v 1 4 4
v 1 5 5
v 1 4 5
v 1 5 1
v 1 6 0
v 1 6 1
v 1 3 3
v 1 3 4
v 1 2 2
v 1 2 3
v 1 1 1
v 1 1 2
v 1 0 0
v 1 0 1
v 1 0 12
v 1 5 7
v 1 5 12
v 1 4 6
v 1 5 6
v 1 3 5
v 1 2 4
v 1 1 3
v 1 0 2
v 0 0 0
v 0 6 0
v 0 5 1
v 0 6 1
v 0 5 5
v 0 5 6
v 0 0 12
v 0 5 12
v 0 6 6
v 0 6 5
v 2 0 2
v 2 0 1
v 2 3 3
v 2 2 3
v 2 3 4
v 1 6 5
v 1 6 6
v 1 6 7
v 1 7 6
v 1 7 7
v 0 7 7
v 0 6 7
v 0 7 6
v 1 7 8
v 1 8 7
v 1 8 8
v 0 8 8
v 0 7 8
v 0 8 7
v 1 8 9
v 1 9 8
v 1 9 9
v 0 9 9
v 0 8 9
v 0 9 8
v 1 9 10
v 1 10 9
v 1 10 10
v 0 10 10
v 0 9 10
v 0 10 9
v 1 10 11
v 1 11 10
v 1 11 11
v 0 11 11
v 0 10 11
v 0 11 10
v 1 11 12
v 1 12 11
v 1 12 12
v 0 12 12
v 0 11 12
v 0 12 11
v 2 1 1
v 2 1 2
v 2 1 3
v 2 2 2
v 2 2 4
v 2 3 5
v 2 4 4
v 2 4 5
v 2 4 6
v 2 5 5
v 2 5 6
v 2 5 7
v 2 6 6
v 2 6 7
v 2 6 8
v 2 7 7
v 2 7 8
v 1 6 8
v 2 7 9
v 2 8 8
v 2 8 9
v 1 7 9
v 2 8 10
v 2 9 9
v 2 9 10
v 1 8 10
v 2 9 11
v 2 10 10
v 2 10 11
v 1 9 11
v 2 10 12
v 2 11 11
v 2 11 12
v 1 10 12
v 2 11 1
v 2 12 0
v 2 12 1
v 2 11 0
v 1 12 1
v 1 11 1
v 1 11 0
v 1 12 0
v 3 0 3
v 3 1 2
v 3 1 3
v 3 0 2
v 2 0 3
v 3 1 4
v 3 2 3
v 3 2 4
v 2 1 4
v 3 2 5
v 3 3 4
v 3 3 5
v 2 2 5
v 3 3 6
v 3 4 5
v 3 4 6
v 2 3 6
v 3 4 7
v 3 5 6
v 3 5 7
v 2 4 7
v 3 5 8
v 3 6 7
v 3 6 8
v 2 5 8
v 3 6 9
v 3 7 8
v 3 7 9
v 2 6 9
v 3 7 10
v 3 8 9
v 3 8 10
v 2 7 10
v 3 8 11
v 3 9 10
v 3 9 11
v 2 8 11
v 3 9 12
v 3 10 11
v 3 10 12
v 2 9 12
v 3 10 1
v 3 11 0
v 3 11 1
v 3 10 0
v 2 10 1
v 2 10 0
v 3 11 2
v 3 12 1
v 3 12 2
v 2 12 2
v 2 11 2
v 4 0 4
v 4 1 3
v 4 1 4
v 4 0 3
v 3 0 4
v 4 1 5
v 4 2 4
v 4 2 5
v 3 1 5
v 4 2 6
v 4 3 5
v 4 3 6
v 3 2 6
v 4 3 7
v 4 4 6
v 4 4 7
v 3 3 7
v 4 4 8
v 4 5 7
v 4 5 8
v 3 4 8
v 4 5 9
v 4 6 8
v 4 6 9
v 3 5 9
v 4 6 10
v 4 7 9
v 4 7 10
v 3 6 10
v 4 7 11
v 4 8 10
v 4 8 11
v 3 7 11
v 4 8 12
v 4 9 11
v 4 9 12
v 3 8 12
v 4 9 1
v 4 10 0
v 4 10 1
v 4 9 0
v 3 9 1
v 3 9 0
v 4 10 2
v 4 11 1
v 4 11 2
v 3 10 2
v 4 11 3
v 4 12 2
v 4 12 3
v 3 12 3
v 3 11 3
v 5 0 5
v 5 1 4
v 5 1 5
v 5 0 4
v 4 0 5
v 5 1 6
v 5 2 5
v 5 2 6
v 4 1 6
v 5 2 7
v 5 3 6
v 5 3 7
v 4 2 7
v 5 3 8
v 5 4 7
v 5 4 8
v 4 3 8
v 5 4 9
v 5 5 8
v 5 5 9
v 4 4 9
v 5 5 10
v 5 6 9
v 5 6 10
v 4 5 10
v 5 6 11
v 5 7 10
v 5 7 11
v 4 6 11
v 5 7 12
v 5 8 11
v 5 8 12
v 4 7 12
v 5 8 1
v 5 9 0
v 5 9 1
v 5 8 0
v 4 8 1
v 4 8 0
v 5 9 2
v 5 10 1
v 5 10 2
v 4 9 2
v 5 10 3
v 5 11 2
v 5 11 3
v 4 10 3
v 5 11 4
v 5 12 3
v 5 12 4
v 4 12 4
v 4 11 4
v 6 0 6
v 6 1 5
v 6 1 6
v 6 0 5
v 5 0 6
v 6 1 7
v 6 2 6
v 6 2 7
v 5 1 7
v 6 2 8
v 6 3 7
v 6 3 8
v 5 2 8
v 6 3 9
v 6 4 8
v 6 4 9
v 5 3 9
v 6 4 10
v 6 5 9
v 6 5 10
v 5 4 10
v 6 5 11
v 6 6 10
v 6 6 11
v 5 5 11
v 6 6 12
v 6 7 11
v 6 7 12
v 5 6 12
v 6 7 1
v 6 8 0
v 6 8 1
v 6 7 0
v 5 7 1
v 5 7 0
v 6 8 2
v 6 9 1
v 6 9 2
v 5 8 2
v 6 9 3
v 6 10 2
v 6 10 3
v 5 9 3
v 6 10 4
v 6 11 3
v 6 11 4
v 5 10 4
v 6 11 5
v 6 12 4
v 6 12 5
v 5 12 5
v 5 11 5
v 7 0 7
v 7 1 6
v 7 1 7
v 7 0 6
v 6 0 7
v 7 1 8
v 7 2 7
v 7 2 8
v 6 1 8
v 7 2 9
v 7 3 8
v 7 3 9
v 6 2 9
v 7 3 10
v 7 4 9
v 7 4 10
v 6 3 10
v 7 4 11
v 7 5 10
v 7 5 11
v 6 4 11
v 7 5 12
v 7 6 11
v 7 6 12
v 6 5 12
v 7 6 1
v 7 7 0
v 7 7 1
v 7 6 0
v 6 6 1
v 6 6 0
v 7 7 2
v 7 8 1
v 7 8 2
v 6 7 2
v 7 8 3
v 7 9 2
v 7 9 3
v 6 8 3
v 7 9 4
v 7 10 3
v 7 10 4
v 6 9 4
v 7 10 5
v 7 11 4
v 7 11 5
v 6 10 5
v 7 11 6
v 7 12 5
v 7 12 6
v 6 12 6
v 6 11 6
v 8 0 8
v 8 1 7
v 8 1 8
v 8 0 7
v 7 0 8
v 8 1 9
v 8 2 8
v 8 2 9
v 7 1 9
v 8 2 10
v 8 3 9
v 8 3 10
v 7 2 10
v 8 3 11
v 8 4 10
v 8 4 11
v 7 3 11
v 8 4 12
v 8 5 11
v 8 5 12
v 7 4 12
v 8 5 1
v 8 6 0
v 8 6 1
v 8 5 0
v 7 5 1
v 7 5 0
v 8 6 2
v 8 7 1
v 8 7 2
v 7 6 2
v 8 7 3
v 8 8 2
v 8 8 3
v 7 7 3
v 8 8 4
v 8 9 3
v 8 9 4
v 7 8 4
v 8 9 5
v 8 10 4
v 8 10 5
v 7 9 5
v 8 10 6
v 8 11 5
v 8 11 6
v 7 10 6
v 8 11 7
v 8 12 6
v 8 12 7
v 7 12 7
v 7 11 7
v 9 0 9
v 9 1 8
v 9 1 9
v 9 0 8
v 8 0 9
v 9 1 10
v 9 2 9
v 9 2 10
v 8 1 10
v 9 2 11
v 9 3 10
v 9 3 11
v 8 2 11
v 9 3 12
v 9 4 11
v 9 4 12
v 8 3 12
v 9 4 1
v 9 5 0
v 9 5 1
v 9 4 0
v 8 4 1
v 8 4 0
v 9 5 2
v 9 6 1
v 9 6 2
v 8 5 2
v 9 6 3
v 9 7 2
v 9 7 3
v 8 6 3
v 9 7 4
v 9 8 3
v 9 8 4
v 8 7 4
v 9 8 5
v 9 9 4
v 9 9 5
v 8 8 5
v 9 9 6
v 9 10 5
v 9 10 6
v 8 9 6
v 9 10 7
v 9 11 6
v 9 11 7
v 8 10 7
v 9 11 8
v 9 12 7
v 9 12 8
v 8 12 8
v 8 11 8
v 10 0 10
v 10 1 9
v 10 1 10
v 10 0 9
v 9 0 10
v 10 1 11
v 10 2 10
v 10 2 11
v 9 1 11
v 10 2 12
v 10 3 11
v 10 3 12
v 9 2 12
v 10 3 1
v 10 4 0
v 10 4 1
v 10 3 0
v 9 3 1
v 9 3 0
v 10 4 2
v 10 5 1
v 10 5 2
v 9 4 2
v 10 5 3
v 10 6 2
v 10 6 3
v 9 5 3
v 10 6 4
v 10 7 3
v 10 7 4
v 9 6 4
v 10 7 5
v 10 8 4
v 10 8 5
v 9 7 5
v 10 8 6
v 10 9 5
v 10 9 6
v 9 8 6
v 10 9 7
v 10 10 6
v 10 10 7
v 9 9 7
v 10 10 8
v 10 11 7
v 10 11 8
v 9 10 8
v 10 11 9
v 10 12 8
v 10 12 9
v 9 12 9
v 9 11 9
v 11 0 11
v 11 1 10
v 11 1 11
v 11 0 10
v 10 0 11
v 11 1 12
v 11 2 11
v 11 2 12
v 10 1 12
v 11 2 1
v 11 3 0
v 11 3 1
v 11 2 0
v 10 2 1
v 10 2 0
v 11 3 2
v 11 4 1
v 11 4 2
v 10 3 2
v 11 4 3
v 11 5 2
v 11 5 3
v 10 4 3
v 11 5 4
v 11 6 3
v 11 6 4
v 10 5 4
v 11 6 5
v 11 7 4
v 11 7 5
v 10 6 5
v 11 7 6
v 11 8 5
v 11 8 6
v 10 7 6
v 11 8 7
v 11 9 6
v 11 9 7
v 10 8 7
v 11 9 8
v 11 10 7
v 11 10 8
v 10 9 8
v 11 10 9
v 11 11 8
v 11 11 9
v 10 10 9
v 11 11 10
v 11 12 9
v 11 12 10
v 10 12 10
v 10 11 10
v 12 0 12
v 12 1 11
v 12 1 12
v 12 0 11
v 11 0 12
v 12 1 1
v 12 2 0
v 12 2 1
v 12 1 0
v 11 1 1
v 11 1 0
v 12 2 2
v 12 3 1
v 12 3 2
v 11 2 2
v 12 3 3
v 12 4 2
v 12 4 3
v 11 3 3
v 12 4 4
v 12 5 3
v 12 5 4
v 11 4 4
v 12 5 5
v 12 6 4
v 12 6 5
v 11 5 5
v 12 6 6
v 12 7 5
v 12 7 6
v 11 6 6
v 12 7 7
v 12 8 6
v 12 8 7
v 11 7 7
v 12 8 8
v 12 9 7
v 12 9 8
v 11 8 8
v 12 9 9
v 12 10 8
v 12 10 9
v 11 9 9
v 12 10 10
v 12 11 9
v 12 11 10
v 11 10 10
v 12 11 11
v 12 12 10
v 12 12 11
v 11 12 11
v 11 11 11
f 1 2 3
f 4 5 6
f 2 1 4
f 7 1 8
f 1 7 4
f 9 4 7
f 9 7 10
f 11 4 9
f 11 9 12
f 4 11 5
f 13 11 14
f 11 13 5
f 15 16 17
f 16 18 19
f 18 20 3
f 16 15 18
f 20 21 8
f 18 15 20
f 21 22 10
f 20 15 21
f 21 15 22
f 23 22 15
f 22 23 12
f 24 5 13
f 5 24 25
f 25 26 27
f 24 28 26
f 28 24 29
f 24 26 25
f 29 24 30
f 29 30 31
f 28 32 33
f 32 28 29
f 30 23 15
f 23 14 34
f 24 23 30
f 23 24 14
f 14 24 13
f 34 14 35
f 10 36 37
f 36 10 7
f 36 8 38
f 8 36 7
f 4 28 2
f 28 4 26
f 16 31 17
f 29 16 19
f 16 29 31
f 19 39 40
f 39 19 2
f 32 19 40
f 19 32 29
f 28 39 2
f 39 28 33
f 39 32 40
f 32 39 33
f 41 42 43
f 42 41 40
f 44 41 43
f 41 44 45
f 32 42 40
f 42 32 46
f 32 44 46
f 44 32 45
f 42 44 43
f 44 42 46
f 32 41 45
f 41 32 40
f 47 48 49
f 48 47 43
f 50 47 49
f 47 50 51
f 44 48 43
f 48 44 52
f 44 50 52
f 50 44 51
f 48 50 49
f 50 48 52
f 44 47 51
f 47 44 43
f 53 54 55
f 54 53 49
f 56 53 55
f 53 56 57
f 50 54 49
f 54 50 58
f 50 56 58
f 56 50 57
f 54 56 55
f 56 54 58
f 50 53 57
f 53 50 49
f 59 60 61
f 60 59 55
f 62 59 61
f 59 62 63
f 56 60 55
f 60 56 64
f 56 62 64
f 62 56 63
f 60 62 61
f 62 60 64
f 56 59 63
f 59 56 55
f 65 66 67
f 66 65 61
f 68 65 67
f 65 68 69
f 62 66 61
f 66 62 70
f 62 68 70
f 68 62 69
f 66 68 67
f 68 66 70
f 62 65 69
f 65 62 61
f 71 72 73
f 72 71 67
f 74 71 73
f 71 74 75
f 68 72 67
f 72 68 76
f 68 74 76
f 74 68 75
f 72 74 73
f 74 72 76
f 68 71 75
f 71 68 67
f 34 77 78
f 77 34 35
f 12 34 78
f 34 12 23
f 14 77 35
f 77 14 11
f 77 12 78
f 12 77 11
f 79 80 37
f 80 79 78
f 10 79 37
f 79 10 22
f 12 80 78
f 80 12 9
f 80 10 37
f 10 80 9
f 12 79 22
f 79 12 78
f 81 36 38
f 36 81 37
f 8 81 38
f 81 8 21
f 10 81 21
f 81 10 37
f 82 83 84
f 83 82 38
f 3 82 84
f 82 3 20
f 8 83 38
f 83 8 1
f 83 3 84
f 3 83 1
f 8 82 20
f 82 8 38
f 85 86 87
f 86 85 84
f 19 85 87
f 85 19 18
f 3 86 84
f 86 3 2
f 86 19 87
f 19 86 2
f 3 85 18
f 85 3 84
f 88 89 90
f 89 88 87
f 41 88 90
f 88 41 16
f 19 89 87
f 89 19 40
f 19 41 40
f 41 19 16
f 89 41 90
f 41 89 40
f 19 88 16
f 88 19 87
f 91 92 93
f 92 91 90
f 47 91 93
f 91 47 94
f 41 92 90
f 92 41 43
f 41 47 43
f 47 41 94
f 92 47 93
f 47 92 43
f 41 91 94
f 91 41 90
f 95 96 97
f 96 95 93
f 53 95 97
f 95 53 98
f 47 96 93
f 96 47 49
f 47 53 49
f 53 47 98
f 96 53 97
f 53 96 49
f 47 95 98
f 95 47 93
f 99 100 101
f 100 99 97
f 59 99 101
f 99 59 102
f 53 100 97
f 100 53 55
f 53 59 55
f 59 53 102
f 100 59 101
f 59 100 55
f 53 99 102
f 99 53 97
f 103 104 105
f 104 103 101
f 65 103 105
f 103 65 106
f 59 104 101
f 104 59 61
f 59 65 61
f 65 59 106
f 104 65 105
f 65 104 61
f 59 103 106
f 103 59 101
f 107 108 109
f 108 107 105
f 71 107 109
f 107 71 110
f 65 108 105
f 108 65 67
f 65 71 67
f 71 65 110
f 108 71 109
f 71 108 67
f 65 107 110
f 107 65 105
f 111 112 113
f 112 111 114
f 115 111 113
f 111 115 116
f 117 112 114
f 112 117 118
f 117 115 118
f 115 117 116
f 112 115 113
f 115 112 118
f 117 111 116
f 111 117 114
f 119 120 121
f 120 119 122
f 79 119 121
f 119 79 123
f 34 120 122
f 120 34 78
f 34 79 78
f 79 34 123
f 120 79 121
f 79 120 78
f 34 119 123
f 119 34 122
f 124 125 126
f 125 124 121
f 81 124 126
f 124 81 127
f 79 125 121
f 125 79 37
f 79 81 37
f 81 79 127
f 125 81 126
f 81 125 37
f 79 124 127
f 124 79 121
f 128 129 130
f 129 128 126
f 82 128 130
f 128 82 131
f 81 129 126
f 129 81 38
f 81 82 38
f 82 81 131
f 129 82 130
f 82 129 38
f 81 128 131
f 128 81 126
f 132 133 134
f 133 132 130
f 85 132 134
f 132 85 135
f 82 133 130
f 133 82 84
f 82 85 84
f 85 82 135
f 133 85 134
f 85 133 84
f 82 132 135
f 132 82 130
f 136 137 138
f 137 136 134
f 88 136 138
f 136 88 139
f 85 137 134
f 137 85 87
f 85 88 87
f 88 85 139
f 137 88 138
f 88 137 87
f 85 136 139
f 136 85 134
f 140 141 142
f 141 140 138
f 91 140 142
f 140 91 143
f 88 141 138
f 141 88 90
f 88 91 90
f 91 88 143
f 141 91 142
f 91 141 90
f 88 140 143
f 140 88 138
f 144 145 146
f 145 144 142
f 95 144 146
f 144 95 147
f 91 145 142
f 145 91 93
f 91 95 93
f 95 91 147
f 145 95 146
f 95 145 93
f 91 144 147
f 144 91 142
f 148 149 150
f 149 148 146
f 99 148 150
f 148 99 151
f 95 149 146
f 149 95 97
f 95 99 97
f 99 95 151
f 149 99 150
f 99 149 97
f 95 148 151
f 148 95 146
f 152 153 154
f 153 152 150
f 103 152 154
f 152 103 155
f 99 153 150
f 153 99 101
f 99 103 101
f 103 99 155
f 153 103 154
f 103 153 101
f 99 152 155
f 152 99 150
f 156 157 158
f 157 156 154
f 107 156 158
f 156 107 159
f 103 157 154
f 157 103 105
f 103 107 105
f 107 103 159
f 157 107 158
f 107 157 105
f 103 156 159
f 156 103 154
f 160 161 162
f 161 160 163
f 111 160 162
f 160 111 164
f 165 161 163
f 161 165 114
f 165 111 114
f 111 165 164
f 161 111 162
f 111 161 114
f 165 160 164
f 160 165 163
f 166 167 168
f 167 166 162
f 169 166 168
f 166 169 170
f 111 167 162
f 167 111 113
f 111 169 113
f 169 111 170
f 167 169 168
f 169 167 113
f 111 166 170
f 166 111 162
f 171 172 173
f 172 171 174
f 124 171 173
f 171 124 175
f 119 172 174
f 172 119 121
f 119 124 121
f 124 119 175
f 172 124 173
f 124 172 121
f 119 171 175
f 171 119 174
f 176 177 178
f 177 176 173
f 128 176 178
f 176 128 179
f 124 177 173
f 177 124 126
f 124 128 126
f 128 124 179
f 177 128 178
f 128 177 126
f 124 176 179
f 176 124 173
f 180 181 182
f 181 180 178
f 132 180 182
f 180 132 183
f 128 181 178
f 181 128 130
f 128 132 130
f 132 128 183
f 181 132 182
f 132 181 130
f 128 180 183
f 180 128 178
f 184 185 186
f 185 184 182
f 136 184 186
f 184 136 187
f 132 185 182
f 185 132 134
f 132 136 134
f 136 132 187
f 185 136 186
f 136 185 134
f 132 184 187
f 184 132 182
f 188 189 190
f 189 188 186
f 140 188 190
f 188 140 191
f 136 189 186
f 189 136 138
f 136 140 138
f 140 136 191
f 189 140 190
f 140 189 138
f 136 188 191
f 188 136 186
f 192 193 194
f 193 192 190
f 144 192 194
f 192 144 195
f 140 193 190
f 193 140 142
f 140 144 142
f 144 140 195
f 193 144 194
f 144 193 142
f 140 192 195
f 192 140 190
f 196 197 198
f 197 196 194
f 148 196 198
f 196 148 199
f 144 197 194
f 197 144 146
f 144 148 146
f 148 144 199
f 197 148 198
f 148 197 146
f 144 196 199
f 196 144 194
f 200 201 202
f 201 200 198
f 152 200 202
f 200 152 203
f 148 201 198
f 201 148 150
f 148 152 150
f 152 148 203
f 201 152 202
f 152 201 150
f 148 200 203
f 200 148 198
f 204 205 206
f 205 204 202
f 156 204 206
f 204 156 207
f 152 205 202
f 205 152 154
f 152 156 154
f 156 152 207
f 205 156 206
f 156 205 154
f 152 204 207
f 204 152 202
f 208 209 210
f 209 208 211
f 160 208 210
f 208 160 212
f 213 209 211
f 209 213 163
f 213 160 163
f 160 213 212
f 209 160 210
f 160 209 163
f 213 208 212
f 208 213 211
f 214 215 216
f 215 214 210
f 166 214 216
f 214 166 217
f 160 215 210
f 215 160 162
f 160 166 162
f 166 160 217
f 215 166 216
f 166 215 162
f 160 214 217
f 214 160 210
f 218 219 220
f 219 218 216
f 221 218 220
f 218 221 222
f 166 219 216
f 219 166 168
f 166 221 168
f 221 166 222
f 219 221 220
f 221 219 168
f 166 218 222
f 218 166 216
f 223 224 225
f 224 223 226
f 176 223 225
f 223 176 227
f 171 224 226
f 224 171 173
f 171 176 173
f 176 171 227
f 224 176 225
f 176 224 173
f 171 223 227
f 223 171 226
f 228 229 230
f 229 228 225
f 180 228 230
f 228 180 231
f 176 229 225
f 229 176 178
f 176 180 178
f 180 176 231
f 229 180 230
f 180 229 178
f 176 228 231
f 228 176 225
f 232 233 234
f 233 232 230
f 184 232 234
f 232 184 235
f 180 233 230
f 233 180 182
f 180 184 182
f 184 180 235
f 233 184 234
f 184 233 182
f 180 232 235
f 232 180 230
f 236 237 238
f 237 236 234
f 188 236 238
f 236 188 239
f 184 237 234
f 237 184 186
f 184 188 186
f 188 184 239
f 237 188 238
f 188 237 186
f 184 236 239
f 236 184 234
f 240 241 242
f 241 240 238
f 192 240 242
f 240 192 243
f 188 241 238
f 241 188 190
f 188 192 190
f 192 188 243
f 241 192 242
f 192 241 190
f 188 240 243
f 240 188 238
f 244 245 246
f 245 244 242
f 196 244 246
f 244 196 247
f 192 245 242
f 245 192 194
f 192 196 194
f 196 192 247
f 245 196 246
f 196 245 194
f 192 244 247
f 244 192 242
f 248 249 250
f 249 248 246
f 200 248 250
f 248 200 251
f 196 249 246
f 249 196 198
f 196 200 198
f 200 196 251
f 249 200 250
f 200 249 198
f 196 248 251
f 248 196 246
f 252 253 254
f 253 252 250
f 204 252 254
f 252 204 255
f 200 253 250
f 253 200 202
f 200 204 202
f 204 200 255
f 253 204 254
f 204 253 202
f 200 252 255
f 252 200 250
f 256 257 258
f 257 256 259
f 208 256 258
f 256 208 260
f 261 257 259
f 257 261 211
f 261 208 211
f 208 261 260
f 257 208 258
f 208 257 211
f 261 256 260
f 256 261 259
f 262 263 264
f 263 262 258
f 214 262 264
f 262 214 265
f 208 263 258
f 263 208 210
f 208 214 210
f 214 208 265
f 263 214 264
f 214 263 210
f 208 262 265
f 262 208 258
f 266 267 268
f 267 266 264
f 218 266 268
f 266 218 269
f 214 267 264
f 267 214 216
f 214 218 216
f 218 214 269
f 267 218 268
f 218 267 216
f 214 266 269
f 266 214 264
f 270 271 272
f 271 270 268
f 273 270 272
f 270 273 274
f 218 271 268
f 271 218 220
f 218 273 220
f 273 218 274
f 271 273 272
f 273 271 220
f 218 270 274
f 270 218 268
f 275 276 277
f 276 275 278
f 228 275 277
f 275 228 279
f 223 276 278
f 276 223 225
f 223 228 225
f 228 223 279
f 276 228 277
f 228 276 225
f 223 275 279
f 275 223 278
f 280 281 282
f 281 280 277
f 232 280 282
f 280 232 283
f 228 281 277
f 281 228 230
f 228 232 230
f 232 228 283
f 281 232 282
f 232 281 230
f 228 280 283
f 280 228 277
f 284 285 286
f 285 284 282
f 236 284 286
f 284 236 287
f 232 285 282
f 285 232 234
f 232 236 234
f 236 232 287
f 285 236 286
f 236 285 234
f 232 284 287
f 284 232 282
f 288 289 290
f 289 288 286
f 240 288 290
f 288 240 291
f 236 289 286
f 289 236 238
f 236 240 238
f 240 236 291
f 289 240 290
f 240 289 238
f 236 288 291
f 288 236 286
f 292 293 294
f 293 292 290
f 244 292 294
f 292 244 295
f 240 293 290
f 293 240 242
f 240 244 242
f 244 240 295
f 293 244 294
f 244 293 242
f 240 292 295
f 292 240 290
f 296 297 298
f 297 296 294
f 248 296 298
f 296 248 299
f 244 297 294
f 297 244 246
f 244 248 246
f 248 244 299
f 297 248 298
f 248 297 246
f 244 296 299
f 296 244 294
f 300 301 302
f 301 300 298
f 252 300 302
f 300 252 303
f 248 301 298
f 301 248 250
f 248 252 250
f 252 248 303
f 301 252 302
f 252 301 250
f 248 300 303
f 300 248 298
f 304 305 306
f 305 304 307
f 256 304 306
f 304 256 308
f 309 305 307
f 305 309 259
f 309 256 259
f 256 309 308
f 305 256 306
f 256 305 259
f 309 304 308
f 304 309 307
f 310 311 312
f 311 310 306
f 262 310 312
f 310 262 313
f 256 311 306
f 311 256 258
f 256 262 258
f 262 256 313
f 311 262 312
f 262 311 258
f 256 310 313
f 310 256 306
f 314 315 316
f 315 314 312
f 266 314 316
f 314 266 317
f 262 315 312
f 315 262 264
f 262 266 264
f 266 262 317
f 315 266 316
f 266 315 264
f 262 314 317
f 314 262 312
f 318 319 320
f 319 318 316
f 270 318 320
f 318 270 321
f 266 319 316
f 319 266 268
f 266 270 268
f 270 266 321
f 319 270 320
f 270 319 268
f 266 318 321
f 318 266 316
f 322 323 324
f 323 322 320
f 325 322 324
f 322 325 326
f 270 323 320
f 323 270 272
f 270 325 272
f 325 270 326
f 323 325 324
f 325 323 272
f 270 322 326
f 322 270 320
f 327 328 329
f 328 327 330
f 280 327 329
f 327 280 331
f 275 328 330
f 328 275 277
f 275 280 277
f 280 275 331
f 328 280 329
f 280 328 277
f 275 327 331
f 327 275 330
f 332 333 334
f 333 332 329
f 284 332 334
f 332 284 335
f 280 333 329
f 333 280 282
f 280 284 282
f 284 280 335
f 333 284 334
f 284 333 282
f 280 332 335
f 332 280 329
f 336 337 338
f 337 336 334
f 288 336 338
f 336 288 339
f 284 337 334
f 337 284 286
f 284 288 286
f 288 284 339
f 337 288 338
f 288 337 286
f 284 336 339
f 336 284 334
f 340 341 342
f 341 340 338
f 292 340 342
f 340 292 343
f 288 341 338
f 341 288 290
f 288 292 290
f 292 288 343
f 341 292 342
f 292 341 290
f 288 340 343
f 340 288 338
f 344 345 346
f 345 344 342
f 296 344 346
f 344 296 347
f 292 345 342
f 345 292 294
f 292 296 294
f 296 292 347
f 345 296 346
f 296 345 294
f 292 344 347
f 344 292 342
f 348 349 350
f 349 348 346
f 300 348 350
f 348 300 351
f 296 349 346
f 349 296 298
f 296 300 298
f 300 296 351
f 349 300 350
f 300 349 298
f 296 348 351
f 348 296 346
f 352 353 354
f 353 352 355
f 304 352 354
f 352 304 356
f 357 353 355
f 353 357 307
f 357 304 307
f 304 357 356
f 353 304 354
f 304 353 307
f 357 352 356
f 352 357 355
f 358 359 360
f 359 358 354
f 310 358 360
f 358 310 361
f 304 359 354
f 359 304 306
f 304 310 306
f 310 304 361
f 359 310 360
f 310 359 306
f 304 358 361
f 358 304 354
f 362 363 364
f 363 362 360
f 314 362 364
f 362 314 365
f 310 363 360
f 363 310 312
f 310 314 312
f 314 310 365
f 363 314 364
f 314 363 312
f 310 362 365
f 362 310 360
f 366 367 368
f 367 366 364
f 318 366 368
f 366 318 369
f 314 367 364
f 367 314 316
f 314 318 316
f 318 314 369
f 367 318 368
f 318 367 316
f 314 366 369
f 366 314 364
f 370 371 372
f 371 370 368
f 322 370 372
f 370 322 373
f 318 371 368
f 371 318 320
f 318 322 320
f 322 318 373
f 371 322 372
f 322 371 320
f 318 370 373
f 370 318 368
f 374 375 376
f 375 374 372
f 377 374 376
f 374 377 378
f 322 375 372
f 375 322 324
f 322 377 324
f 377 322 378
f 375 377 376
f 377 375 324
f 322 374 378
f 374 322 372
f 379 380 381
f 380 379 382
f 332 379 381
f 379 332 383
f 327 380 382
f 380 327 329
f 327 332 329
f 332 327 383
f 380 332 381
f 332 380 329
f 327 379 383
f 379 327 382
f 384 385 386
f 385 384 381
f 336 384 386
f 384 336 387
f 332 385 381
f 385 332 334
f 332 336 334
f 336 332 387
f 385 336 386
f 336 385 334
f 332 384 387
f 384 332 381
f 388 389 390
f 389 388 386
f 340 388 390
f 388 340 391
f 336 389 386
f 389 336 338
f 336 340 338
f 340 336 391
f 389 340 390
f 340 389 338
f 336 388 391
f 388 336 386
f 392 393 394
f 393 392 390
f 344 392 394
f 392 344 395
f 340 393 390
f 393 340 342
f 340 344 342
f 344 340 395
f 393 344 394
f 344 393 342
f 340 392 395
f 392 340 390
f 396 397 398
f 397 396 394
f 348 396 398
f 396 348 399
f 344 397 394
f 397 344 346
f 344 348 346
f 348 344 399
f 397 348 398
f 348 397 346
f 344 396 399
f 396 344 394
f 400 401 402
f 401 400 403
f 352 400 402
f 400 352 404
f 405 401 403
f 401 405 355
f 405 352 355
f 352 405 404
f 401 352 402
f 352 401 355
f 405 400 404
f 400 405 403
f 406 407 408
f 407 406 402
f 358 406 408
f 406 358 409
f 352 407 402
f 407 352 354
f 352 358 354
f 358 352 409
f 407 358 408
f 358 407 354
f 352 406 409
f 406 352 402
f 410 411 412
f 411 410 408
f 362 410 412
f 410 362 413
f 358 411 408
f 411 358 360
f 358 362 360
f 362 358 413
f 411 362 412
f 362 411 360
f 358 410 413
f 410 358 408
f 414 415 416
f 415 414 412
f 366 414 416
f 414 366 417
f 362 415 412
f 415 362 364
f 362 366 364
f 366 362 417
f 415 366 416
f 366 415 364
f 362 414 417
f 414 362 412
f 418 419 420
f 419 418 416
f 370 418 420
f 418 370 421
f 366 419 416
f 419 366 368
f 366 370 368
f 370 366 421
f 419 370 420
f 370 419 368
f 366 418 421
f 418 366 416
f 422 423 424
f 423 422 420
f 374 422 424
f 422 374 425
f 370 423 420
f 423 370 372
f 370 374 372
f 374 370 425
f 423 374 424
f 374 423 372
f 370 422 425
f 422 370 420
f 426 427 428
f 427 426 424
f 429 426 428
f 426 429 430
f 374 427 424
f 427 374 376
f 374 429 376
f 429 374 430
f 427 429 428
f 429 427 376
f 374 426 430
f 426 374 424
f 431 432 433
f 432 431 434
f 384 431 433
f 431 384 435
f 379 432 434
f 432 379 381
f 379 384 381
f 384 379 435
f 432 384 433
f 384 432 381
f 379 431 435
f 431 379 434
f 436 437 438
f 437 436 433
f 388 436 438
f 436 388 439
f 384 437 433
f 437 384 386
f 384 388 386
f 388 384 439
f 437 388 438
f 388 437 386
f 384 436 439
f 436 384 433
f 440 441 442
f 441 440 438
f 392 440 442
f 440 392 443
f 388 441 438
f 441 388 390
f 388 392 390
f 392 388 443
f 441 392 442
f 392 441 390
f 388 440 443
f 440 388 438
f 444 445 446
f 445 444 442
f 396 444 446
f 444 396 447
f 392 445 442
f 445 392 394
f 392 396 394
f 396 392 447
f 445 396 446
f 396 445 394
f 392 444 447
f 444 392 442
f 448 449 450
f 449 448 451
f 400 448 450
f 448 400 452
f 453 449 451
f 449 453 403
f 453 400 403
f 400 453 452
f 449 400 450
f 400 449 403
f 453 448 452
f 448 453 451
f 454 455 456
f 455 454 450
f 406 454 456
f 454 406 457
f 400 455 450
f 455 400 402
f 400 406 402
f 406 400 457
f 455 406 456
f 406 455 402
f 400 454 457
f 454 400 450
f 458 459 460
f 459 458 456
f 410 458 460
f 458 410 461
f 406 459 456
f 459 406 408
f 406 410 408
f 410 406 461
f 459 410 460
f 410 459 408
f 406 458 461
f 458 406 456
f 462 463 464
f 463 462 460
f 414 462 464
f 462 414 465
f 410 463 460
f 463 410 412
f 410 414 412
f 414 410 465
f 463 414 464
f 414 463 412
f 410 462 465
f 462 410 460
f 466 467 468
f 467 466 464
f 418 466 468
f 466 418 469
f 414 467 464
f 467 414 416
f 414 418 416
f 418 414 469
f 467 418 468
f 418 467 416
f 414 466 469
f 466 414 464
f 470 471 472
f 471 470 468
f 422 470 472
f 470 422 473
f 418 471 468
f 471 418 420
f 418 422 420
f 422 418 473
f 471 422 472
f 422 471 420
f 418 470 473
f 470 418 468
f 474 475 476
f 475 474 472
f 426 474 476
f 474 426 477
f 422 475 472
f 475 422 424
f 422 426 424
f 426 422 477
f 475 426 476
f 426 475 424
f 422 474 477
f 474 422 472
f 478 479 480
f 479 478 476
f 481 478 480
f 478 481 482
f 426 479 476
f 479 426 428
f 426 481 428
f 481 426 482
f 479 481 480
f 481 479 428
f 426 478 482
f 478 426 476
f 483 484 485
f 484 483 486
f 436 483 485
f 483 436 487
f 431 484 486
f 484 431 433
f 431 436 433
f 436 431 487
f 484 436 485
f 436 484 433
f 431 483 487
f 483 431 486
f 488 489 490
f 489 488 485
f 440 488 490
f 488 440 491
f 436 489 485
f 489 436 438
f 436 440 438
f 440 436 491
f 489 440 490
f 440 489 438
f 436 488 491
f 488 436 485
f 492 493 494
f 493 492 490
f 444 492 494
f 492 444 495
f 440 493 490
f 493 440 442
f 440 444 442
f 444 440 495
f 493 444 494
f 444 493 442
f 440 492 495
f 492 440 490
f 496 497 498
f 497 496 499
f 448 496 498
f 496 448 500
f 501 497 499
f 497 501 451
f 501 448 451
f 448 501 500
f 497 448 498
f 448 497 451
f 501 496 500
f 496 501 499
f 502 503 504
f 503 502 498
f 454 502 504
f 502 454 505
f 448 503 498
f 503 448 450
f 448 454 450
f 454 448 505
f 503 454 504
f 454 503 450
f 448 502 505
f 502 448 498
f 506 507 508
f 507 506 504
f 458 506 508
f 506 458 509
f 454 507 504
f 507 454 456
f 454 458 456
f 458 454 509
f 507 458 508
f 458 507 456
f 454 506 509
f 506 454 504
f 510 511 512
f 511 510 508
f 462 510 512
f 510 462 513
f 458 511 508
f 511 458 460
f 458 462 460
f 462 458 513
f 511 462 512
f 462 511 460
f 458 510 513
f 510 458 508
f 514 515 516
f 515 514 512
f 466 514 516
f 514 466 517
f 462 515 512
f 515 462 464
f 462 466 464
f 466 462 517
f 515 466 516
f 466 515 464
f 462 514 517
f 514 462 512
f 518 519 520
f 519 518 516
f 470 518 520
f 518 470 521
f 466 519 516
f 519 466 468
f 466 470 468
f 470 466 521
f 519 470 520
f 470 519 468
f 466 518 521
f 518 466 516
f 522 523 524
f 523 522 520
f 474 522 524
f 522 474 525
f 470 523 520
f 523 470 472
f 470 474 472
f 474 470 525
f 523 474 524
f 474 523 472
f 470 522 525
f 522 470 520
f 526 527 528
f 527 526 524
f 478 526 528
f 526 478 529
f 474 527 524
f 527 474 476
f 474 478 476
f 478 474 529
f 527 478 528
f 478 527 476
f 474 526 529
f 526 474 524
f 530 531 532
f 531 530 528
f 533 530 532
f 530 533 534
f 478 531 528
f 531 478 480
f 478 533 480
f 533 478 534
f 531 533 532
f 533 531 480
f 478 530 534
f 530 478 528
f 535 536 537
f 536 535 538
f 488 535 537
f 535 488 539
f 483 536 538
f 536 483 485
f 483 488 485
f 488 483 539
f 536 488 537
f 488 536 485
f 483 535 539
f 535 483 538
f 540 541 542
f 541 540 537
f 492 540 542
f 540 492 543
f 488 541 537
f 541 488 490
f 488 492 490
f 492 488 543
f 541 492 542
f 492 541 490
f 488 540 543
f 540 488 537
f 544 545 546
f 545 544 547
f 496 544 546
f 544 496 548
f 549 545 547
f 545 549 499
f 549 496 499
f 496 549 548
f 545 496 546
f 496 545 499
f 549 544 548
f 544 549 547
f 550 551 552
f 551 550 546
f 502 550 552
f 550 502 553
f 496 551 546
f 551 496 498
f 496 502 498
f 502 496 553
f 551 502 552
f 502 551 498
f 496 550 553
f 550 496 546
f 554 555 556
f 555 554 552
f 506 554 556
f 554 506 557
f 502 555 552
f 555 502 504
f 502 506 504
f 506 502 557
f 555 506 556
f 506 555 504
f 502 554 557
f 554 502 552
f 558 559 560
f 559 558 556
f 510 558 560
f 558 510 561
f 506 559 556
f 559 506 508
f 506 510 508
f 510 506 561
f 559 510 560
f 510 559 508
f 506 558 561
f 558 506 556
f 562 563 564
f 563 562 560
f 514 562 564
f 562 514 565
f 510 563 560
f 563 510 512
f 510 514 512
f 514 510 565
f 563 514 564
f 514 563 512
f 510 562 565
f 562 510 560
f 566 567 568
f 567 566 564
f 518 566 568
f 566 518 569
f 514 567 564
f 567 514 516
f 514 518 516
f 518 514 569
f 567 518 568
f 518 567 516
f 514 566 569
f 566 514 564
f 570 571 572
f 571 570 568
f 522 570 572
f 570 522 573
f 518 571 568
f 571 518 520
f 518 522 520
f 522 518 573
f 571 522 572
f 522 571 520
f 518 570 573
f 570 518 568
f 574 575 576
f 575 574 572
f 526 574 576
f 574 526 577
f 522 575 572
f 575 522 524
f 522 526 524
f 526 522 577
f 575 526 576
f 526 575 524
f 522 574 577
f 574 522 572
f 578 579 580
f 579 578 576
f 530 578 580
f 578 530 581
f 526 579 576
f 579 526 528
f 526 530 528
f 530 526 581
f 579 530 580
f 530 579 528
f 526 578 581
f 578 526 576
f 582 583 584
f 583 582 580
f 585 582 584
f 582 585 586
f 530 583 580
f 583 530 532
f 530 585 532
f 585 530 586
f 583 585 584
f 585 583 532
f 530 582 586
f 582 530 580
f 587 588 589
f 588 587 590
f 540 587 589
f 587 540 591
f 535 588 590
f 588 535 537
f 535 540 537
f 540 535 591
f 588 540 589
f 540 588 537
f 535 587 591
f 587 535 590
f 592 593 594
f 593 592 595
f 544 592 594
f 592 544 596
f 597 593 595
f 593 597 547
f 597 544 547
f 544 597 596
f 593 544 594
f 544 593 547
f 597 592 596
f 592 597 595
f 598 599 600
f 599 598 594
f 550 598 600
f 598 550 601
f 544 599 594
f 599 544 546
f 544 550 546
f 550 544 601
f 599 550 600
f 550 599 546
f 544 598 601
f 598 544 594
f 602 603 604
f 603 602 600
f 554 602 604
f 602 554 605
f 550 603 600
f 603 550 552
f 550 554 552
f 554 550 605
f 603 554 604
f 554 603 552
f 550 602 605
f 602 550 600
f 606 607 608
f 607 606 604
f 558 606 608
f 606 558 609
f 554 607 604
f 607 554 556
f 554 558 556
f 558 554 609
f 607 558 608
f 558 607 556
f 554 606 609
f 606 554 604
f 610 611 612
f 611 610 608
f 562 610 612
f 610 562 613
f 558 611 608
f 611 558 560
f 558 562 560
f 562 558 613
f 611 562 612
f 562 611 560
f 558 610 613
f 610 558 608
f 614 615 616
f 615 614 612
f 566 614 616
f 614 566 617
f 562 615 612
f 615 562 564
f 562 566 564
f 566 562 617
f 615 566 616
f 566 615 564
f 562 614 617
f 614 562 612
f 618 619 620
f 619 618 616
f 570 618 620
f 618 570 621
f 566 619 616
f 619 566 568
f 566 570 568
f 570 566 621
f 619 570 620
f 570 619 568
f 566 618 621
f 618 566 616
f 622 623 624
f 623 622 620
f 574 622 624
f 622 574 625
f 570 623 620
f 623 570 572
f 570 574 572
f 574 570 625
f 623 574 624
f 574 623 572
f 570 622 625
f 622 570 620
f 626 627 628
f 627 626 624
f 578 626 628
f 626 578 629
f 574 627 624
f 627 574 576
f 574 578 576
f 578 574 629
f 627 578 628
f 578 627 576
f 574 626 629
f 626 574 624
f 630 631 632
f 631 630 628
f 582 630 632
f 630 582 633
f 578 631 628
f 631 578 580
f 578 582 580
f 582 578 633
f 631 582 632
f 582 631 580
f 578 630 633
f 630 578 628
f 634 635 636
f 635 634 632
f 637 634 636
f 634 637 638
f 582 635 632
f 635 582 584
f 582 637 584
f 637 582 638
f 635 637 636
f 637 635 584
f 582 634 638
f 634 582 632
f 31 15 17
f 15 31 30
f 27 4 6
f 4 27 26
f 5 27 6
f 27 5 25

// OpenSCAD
union() {
    translate([0, 0, 0]) cube([1, 1, 1]);
    translate([0, 1, 1]) cube([1, 1, 1]);
    translate([0, 2, 2]) cube([1, 1, 1]);
    translate([0, 3, 3]) cube([1, 1, 1]);
    translate([0, 4, 4]) cube([1, 1, 1]);
    translate([0, 5, 5]) cube([1, 1, 1]);
    translate([0, 6, 6]) cube([1, 1, 1]);
    translate([0, 7, 7]) cube([1, 1, 1]);
    translate([0, 8, 8]) cube([1, 1, 1]);
    translate([0, 9, 9]) cube([1, 1, 1]);
    translate([0, 10, 10]) cube([1, 1, 1]);
    translate([0, 11, 11]) cube([1, 1, 1]);
    translate([1, 0, 1]) cube([1, 1, 1]);
    translate([1, 1, 2]) cube([1, 1, 1]);
    translate([1, 2, 3]) cube([1, 1, 1]);
    translate([1, 3, 4]) cube([1, 1, 1]);
    translate([1, 4, 5]) cube([1, 1, 1]);
    translate([1, 5, 6]) cube([1, 1, 1]);
    translate([1, 6, 7]) cube([1, 1, 1]);
    translate([1, 7, 8]) cube([1, 1, 1]);
    translate([1, 8, 9]) cube([1, 1, 1]);
    translate([1, 9, 10]) cube([1, 1, 1]);
    translate([1, 10, 11]) cube([1, 1, 1]);
    translate([1, 11, 0]) cube([1, 1, 1]);
    translate([2, 0, 2]) cube([1, 1, 1]);
    translate([2, 1, 3]) cube([1, 1, 1]);
    translate([2, 2, 4]) cube([1, 1, 1]);
    translate([2, 3, 5]) cube([1, 1, 1]);
    translate([2, 4, 6]) cube([1, 1, 1]);
    translate([2, 5, 7]) cube([1, 1, 1]);
    translate([2, 6, 8]) cube([1, 1, 1]);
    translate([2, 7, 9]) cube([1, 1, 1]);
    translate([2, 8, 10]) cube([1, 1, 1]);
    translate([2, 9, 11]) cube([1, 1, 1]);
    translate([2, 10, 0]) cube([1, 1, 1]);
    translate([2, 11, 1]) cube([1, 1, 1]);
    translate([3, 0, 3]) cube([1, 1, 1]);
    translate([3, 1, 4]) cube([1, 1, 1]);
    translate([3, 2, 5]) cube([1, 1, 1]);
    translate([3, 3, 6]) cube([1, 1, 1]);
    translate([3, 4, 7]) cube([1, 1, 1]);
    translate([3, 5, 8]) cube([1, 1, 1]);
    translate([3, 6, 9]) cube([1, 1, 1]);
    translate([3, 7, 10]) cube([1, 1, 1]);
    translate([3, 8, 11]) cube([1, 1, 1]);
    translate([3, 9, 0]) cube([1, 1, 1]);
    translate([3, 10, 1]) cube([1, 1, 1]);
    translate([3, 11, 2]) cube([1, 1, 1]);
    translate([4, 0, 4]) cube([1, 1, 1]);
    translate([4, 1, 5]) cube([1, 1, 1]);
    translate([4, 2, 6]) cube([1, 1, 1]);
    translate([4, 3, 7]) cube([1, 1, 1]);
    translate([4, 4, 8]) cube([1, 1, 1]);
    translate([4, 5, 9]) cube([1, 1, 1]);
    translate([4, 6, 10]) cube([1, 1, 1]);
    translate([4, 7, 11]) cube([1, 1, 1]);
    translate([4, 8, 0]) cube([1, 1, 1]);
    translate([4, 9, 1]) cube([1, 1, 1]);
    translate([4, 10, 2]) cube([1, 1, 1]);
    translate([4, 11, 3]) cube([1, 1, 1]);
    translate([5, 0, 5]) cube([1, 1, 1]);
    translate([5, 1, 6]) cube([1, 1, 1]);
    translate([5, 2, 7]) cube([1, 1, 1]);
    translate([5, 3, 8]) cube([1, 1, 1]);
    translate([5, 4, 9]) cube([1, 1, 1]);
    translate([5, 5, 10]) cube([1, 1, 1]);
    translate([5, 6, 11]) cube([1, 1, 1]);
    translate([5, 7, 0]) cube([1, 1, 1]);
    translate([5, 8, 1]) cube([1, 1, 1]);
    translate([5, 9, 2]) cube([1, 1, 1]);
    translate([5, 10, 3]) cube([1, 1, 1]);
    translate([5, 11, 4]) cube([1, 1, 1]);
    translate([6, 0, 6]) cube([1, 1, 1]);
    translate([6, 1, 7]) cube([1, 1, 1]);
    translate([6, 2, 8]) cube([1, 1, 1]);
    translate([6, 3, 9]) cube([1, 1, 1]);
    translate([6, 4, 10]) cube([1, 1, 1]);
    translate([6, 5, 11]) cube([1, 1, 1]);
    translate([6, 6, 0]) cube([1, 1, 1]);
    translate([6, 7, 1]) cube([1, 1, 1]);
    translate([6, 8, 2]) cube([1, 1, 1]);
    translate([6, 9, 3]) cube([1, 1, 1]);
    translate([6, 10, 4]) cube([1, 1, 1]);
    translate([6, 11, 5]) cube([1, 1, 1]);
    translate([7, 0, 7]) cube([1, 1, 1]);
    translate([7, 1, 8]) cube([1, 1, 1]);
    translate([7, 2, 9]) cube([1, 1, 1]);
    translate([7, 3, 10]) cube([1, 1, 1]);
    translate([7, 4, 11]) cube([1, 1, 1]);
    translate([7, 5, 0]) cube([1, 1, 1]);
    translate([7, 6, 1]) cube([1, 1, 1]);
    translate([7, 7, 2]) cube([1, 1, 1]);
    translate([7, 8, 3]) cube([1, 1, 1]);
    translate([7, 9, 4]) cube([1, 1, 1]);
    translate([7, 10, 5]) cube([1, 1, 1]);
    translate([7, 11, 6]) cube([1, 1, 1]);
    translate([8, 0, 8]) cube([1, 1, 1]);
    translate([8, 1, 9]) cube([1, 1, 1]);
    translate([8, 2, 10]) cube([1, 1, 1]);
    translate([8, 3, 11]) cube([1, 1, 1]);
    translate([8, 4, 0]) cube([1, 1, 1]);
    translate([8, 5, 1]) cube([1, 1, 1]);
    translate([8, 6, 2]) cube([1, 1, 1]);
    translate([8, 7, 3]) cube([1, 1, 1]);
    translate([8, 8, 4]) cube([1, 1, 1]);
    translate([8, 9, 5]) cube([1, 1, 1]);
    translate([8, 10, 6]) cube([1, 1, 1]);
    translate([8, 11, 7]) cube([1, 1, 1]);
    translate([9, 0, 9]) cube([1, 1, 1]);
    translate([9, 1, 10]) cube([1, 1, 1]);
    translate([9, 2, 11]) cube([1, 1, 1]);
    translate([9, 3, 0]) cube([1, 1, 1]);
    translate([9, 4, 1]) cube([1, 1, 1]);
    translate([9, 5, 2]) cube([1, 1, 1]);
    translate([9, 6, 3]) cube([1, 1, 1]);
    translate([9, 7, 4]) cube([1, 1, 1]);
    translate([9, 8, 5]) cube([1, 1, 1]);
    translate([9, 9, 6]) cube([1, 1, 1]);
    translate([9, 10, 7]) cube([1, 1, 1]);
    translate([9, 11, 8]) cube([1, 1, 1]);
    translate([10, 0, 10]) cube([1, 1, 1]);
    translate([10, 1, 11]) cube([1, 1, 1]);
    translate([10, 2, 0]) cube([1, 1, 1]);
    translate([10, 3, 1]) cube([1, 1, 1]);
    translate([10, 4, 2]) cube([1, 1, 1]);
    translate([10, 5, 3]) cube([1, 1, 1]);
    translate([10, 6, 4]) cube([1, 1, 1]);
    translate([10, 7, 5]) cube([1, 1, 1]);
    translate([10, 8, 6]) cube([1, 1, 1]);
    translate([10, 9, 7]) cube([1, 1, 1]);
    translate([10, 10, 8]) cube([1, 1, 1]);
    translate([10, 11, 9]) cube([1, 1, 1]);
    translate([11, 0, 11]) cube([1, 1, 1]);
    translate([11, 1, 0]) cube([1, 1, 1]);
    translate([11, 2, 1]) cube([1, 1, 1]);
    translate([11, 3, 2]) cube([1, 1, 1]);
    translate([11, 4, 3]) cube([1, 1, 1]);
    translate([11, 5, 4]) cube([1, 1, 1]);
    translate([11, 6, 5]) cube([1, 1, 1]);
    translate([11, 7, 6]) cube([1, 1, 1]);
    translate([11, 8, 7]) cube([1, 1, 1]);
    translate([11, 9, 8]) cube([1, 1, 1]);
    translate([11, 10, 9]) cube([1, 1, 1]);
    translate([11, 11, 10]) cube([1, 1, 1]);
    translate([0, 0, 1]) cube([1, 1, 1]);
    translate([0, 0, 2]) cube([1, 1, 1]);
    translate([0, 0, 3]) cube([1, 1, 1]);
    translate([0, 0, 4]) cube([1, 1, 1]);
    translate([0, 0, 5]) cube([1, 1, 1]);
    translate([0, 0, 6]) cube([1, 1, 1]);
    translate([0, 0, 7]) cube([1, 1, 1]);
    translate([0, 0, 8]) cube([1, 1, 1]);
    translate([0, 0, 9]) cube([1, 1, 1]);
    translate([0, 0, 10]) cube([1, 1, 1]);
    translate([0, 0, 11]) cube([1, 1, 1]);
    translate([0, 1, 0]) cube([1, 1, 1]);
    translate([0, 1, 2]) cube([1, 1, 1]);
    translate([0, 1, 3]) cube([1, 1, 1]);
    translate([0, 1, 4]) cube([1, 1, 1]);
    translate([0, 1, 5]) cube([1, 1, 1]);
    translate([0, 1, 6]) cube([1, 1, 1]);
    translate([0, 1, 7]) cube([1, 1, 1]);
    translate([0, 1, 8]) cube([1, 1, 1]);
    translate([0, 1, 9]) cube([1, 1, 1]);
    translate([0, 1, 10]) cube([1, 1, 1]);
    translate([0, 1, 11]) cube([1, 1, 1]);
    translate([0, 2, 0]) cube([1, 1, 1]);
    translate([0, 2, 1]) cube([1, 1, 1]);
    translate([0, 2, 3]) cube([1, 1, 1]);
    translate([0, 2, 4]) cube([1, 1, 1]);
    translate([0, 2, 5]) cube([1, 1, 1]);
    translate([0, 2, 6]) cube([1, 1, 1]);
    translate([0, 2, 7]) cube([1, 1, 1]);
    translate([0, 2, 8]) cube([1, 1, 1]);
    translate([0, 2, 9]) cube([1, 1, 1]);
    translate([0, 2, 10]) cube([1, 1, 1]);
    translate([0, 2, 11]) cube([1, 1, 1]);
    translate([0, 3, 0]) cube([1, 1, 1]);
    translate([0, 3, 1]) cube([1, 1, 1]);
    translate([0, 3, 2]) cube([1, 1, 1]);
    translate([0, 3, 4]) cube([1, 1, 1]);
    translate([0, 3, 5]) cube([1, 1, 1]);
    translate([0, 3, 6]) cube([1, 1, 1]);
    translate([0, 3, 7]) cube([1, 1, 1]);
    translate([0, 3, 8]) cube([1, 1, 1]);
    translate([0, 3, 9]) cube([1, 1, 1]);
    translate([0, 3, 10]) cube([1, 1, 1]);
    translate([0, 3, 11]) cube([1, 1, 1]);
    translate([0, 4, 0]) cube([1, 1, 1]);
    translate([0, 4, 1]) cube([1, 1, 1]);
    translate([0, 4, 2]) cube([1, 1, 1]);
    translate([0, 4, 3]) cube([1, 1, 1]);
    translate([0, 4, 5]) cube([1, 1, 1]);
    translate([0, 4, 6]) cube([1, 1, 1]);
    translate([0, 4, 7]) cube([1, 1, 1]);
    translate([0, 4, 8]) cube([1, 1, 1]);
    translate([0, 4, 9]) cube([1, 1, 1]);
    translate([0, 4, 10]) cube([1, 1, 1]);
    translate([0, 4, 11]) cube([1, 1, 1]);
    translate([0, 5, 0]) cube([1, 1, 1]);
}
